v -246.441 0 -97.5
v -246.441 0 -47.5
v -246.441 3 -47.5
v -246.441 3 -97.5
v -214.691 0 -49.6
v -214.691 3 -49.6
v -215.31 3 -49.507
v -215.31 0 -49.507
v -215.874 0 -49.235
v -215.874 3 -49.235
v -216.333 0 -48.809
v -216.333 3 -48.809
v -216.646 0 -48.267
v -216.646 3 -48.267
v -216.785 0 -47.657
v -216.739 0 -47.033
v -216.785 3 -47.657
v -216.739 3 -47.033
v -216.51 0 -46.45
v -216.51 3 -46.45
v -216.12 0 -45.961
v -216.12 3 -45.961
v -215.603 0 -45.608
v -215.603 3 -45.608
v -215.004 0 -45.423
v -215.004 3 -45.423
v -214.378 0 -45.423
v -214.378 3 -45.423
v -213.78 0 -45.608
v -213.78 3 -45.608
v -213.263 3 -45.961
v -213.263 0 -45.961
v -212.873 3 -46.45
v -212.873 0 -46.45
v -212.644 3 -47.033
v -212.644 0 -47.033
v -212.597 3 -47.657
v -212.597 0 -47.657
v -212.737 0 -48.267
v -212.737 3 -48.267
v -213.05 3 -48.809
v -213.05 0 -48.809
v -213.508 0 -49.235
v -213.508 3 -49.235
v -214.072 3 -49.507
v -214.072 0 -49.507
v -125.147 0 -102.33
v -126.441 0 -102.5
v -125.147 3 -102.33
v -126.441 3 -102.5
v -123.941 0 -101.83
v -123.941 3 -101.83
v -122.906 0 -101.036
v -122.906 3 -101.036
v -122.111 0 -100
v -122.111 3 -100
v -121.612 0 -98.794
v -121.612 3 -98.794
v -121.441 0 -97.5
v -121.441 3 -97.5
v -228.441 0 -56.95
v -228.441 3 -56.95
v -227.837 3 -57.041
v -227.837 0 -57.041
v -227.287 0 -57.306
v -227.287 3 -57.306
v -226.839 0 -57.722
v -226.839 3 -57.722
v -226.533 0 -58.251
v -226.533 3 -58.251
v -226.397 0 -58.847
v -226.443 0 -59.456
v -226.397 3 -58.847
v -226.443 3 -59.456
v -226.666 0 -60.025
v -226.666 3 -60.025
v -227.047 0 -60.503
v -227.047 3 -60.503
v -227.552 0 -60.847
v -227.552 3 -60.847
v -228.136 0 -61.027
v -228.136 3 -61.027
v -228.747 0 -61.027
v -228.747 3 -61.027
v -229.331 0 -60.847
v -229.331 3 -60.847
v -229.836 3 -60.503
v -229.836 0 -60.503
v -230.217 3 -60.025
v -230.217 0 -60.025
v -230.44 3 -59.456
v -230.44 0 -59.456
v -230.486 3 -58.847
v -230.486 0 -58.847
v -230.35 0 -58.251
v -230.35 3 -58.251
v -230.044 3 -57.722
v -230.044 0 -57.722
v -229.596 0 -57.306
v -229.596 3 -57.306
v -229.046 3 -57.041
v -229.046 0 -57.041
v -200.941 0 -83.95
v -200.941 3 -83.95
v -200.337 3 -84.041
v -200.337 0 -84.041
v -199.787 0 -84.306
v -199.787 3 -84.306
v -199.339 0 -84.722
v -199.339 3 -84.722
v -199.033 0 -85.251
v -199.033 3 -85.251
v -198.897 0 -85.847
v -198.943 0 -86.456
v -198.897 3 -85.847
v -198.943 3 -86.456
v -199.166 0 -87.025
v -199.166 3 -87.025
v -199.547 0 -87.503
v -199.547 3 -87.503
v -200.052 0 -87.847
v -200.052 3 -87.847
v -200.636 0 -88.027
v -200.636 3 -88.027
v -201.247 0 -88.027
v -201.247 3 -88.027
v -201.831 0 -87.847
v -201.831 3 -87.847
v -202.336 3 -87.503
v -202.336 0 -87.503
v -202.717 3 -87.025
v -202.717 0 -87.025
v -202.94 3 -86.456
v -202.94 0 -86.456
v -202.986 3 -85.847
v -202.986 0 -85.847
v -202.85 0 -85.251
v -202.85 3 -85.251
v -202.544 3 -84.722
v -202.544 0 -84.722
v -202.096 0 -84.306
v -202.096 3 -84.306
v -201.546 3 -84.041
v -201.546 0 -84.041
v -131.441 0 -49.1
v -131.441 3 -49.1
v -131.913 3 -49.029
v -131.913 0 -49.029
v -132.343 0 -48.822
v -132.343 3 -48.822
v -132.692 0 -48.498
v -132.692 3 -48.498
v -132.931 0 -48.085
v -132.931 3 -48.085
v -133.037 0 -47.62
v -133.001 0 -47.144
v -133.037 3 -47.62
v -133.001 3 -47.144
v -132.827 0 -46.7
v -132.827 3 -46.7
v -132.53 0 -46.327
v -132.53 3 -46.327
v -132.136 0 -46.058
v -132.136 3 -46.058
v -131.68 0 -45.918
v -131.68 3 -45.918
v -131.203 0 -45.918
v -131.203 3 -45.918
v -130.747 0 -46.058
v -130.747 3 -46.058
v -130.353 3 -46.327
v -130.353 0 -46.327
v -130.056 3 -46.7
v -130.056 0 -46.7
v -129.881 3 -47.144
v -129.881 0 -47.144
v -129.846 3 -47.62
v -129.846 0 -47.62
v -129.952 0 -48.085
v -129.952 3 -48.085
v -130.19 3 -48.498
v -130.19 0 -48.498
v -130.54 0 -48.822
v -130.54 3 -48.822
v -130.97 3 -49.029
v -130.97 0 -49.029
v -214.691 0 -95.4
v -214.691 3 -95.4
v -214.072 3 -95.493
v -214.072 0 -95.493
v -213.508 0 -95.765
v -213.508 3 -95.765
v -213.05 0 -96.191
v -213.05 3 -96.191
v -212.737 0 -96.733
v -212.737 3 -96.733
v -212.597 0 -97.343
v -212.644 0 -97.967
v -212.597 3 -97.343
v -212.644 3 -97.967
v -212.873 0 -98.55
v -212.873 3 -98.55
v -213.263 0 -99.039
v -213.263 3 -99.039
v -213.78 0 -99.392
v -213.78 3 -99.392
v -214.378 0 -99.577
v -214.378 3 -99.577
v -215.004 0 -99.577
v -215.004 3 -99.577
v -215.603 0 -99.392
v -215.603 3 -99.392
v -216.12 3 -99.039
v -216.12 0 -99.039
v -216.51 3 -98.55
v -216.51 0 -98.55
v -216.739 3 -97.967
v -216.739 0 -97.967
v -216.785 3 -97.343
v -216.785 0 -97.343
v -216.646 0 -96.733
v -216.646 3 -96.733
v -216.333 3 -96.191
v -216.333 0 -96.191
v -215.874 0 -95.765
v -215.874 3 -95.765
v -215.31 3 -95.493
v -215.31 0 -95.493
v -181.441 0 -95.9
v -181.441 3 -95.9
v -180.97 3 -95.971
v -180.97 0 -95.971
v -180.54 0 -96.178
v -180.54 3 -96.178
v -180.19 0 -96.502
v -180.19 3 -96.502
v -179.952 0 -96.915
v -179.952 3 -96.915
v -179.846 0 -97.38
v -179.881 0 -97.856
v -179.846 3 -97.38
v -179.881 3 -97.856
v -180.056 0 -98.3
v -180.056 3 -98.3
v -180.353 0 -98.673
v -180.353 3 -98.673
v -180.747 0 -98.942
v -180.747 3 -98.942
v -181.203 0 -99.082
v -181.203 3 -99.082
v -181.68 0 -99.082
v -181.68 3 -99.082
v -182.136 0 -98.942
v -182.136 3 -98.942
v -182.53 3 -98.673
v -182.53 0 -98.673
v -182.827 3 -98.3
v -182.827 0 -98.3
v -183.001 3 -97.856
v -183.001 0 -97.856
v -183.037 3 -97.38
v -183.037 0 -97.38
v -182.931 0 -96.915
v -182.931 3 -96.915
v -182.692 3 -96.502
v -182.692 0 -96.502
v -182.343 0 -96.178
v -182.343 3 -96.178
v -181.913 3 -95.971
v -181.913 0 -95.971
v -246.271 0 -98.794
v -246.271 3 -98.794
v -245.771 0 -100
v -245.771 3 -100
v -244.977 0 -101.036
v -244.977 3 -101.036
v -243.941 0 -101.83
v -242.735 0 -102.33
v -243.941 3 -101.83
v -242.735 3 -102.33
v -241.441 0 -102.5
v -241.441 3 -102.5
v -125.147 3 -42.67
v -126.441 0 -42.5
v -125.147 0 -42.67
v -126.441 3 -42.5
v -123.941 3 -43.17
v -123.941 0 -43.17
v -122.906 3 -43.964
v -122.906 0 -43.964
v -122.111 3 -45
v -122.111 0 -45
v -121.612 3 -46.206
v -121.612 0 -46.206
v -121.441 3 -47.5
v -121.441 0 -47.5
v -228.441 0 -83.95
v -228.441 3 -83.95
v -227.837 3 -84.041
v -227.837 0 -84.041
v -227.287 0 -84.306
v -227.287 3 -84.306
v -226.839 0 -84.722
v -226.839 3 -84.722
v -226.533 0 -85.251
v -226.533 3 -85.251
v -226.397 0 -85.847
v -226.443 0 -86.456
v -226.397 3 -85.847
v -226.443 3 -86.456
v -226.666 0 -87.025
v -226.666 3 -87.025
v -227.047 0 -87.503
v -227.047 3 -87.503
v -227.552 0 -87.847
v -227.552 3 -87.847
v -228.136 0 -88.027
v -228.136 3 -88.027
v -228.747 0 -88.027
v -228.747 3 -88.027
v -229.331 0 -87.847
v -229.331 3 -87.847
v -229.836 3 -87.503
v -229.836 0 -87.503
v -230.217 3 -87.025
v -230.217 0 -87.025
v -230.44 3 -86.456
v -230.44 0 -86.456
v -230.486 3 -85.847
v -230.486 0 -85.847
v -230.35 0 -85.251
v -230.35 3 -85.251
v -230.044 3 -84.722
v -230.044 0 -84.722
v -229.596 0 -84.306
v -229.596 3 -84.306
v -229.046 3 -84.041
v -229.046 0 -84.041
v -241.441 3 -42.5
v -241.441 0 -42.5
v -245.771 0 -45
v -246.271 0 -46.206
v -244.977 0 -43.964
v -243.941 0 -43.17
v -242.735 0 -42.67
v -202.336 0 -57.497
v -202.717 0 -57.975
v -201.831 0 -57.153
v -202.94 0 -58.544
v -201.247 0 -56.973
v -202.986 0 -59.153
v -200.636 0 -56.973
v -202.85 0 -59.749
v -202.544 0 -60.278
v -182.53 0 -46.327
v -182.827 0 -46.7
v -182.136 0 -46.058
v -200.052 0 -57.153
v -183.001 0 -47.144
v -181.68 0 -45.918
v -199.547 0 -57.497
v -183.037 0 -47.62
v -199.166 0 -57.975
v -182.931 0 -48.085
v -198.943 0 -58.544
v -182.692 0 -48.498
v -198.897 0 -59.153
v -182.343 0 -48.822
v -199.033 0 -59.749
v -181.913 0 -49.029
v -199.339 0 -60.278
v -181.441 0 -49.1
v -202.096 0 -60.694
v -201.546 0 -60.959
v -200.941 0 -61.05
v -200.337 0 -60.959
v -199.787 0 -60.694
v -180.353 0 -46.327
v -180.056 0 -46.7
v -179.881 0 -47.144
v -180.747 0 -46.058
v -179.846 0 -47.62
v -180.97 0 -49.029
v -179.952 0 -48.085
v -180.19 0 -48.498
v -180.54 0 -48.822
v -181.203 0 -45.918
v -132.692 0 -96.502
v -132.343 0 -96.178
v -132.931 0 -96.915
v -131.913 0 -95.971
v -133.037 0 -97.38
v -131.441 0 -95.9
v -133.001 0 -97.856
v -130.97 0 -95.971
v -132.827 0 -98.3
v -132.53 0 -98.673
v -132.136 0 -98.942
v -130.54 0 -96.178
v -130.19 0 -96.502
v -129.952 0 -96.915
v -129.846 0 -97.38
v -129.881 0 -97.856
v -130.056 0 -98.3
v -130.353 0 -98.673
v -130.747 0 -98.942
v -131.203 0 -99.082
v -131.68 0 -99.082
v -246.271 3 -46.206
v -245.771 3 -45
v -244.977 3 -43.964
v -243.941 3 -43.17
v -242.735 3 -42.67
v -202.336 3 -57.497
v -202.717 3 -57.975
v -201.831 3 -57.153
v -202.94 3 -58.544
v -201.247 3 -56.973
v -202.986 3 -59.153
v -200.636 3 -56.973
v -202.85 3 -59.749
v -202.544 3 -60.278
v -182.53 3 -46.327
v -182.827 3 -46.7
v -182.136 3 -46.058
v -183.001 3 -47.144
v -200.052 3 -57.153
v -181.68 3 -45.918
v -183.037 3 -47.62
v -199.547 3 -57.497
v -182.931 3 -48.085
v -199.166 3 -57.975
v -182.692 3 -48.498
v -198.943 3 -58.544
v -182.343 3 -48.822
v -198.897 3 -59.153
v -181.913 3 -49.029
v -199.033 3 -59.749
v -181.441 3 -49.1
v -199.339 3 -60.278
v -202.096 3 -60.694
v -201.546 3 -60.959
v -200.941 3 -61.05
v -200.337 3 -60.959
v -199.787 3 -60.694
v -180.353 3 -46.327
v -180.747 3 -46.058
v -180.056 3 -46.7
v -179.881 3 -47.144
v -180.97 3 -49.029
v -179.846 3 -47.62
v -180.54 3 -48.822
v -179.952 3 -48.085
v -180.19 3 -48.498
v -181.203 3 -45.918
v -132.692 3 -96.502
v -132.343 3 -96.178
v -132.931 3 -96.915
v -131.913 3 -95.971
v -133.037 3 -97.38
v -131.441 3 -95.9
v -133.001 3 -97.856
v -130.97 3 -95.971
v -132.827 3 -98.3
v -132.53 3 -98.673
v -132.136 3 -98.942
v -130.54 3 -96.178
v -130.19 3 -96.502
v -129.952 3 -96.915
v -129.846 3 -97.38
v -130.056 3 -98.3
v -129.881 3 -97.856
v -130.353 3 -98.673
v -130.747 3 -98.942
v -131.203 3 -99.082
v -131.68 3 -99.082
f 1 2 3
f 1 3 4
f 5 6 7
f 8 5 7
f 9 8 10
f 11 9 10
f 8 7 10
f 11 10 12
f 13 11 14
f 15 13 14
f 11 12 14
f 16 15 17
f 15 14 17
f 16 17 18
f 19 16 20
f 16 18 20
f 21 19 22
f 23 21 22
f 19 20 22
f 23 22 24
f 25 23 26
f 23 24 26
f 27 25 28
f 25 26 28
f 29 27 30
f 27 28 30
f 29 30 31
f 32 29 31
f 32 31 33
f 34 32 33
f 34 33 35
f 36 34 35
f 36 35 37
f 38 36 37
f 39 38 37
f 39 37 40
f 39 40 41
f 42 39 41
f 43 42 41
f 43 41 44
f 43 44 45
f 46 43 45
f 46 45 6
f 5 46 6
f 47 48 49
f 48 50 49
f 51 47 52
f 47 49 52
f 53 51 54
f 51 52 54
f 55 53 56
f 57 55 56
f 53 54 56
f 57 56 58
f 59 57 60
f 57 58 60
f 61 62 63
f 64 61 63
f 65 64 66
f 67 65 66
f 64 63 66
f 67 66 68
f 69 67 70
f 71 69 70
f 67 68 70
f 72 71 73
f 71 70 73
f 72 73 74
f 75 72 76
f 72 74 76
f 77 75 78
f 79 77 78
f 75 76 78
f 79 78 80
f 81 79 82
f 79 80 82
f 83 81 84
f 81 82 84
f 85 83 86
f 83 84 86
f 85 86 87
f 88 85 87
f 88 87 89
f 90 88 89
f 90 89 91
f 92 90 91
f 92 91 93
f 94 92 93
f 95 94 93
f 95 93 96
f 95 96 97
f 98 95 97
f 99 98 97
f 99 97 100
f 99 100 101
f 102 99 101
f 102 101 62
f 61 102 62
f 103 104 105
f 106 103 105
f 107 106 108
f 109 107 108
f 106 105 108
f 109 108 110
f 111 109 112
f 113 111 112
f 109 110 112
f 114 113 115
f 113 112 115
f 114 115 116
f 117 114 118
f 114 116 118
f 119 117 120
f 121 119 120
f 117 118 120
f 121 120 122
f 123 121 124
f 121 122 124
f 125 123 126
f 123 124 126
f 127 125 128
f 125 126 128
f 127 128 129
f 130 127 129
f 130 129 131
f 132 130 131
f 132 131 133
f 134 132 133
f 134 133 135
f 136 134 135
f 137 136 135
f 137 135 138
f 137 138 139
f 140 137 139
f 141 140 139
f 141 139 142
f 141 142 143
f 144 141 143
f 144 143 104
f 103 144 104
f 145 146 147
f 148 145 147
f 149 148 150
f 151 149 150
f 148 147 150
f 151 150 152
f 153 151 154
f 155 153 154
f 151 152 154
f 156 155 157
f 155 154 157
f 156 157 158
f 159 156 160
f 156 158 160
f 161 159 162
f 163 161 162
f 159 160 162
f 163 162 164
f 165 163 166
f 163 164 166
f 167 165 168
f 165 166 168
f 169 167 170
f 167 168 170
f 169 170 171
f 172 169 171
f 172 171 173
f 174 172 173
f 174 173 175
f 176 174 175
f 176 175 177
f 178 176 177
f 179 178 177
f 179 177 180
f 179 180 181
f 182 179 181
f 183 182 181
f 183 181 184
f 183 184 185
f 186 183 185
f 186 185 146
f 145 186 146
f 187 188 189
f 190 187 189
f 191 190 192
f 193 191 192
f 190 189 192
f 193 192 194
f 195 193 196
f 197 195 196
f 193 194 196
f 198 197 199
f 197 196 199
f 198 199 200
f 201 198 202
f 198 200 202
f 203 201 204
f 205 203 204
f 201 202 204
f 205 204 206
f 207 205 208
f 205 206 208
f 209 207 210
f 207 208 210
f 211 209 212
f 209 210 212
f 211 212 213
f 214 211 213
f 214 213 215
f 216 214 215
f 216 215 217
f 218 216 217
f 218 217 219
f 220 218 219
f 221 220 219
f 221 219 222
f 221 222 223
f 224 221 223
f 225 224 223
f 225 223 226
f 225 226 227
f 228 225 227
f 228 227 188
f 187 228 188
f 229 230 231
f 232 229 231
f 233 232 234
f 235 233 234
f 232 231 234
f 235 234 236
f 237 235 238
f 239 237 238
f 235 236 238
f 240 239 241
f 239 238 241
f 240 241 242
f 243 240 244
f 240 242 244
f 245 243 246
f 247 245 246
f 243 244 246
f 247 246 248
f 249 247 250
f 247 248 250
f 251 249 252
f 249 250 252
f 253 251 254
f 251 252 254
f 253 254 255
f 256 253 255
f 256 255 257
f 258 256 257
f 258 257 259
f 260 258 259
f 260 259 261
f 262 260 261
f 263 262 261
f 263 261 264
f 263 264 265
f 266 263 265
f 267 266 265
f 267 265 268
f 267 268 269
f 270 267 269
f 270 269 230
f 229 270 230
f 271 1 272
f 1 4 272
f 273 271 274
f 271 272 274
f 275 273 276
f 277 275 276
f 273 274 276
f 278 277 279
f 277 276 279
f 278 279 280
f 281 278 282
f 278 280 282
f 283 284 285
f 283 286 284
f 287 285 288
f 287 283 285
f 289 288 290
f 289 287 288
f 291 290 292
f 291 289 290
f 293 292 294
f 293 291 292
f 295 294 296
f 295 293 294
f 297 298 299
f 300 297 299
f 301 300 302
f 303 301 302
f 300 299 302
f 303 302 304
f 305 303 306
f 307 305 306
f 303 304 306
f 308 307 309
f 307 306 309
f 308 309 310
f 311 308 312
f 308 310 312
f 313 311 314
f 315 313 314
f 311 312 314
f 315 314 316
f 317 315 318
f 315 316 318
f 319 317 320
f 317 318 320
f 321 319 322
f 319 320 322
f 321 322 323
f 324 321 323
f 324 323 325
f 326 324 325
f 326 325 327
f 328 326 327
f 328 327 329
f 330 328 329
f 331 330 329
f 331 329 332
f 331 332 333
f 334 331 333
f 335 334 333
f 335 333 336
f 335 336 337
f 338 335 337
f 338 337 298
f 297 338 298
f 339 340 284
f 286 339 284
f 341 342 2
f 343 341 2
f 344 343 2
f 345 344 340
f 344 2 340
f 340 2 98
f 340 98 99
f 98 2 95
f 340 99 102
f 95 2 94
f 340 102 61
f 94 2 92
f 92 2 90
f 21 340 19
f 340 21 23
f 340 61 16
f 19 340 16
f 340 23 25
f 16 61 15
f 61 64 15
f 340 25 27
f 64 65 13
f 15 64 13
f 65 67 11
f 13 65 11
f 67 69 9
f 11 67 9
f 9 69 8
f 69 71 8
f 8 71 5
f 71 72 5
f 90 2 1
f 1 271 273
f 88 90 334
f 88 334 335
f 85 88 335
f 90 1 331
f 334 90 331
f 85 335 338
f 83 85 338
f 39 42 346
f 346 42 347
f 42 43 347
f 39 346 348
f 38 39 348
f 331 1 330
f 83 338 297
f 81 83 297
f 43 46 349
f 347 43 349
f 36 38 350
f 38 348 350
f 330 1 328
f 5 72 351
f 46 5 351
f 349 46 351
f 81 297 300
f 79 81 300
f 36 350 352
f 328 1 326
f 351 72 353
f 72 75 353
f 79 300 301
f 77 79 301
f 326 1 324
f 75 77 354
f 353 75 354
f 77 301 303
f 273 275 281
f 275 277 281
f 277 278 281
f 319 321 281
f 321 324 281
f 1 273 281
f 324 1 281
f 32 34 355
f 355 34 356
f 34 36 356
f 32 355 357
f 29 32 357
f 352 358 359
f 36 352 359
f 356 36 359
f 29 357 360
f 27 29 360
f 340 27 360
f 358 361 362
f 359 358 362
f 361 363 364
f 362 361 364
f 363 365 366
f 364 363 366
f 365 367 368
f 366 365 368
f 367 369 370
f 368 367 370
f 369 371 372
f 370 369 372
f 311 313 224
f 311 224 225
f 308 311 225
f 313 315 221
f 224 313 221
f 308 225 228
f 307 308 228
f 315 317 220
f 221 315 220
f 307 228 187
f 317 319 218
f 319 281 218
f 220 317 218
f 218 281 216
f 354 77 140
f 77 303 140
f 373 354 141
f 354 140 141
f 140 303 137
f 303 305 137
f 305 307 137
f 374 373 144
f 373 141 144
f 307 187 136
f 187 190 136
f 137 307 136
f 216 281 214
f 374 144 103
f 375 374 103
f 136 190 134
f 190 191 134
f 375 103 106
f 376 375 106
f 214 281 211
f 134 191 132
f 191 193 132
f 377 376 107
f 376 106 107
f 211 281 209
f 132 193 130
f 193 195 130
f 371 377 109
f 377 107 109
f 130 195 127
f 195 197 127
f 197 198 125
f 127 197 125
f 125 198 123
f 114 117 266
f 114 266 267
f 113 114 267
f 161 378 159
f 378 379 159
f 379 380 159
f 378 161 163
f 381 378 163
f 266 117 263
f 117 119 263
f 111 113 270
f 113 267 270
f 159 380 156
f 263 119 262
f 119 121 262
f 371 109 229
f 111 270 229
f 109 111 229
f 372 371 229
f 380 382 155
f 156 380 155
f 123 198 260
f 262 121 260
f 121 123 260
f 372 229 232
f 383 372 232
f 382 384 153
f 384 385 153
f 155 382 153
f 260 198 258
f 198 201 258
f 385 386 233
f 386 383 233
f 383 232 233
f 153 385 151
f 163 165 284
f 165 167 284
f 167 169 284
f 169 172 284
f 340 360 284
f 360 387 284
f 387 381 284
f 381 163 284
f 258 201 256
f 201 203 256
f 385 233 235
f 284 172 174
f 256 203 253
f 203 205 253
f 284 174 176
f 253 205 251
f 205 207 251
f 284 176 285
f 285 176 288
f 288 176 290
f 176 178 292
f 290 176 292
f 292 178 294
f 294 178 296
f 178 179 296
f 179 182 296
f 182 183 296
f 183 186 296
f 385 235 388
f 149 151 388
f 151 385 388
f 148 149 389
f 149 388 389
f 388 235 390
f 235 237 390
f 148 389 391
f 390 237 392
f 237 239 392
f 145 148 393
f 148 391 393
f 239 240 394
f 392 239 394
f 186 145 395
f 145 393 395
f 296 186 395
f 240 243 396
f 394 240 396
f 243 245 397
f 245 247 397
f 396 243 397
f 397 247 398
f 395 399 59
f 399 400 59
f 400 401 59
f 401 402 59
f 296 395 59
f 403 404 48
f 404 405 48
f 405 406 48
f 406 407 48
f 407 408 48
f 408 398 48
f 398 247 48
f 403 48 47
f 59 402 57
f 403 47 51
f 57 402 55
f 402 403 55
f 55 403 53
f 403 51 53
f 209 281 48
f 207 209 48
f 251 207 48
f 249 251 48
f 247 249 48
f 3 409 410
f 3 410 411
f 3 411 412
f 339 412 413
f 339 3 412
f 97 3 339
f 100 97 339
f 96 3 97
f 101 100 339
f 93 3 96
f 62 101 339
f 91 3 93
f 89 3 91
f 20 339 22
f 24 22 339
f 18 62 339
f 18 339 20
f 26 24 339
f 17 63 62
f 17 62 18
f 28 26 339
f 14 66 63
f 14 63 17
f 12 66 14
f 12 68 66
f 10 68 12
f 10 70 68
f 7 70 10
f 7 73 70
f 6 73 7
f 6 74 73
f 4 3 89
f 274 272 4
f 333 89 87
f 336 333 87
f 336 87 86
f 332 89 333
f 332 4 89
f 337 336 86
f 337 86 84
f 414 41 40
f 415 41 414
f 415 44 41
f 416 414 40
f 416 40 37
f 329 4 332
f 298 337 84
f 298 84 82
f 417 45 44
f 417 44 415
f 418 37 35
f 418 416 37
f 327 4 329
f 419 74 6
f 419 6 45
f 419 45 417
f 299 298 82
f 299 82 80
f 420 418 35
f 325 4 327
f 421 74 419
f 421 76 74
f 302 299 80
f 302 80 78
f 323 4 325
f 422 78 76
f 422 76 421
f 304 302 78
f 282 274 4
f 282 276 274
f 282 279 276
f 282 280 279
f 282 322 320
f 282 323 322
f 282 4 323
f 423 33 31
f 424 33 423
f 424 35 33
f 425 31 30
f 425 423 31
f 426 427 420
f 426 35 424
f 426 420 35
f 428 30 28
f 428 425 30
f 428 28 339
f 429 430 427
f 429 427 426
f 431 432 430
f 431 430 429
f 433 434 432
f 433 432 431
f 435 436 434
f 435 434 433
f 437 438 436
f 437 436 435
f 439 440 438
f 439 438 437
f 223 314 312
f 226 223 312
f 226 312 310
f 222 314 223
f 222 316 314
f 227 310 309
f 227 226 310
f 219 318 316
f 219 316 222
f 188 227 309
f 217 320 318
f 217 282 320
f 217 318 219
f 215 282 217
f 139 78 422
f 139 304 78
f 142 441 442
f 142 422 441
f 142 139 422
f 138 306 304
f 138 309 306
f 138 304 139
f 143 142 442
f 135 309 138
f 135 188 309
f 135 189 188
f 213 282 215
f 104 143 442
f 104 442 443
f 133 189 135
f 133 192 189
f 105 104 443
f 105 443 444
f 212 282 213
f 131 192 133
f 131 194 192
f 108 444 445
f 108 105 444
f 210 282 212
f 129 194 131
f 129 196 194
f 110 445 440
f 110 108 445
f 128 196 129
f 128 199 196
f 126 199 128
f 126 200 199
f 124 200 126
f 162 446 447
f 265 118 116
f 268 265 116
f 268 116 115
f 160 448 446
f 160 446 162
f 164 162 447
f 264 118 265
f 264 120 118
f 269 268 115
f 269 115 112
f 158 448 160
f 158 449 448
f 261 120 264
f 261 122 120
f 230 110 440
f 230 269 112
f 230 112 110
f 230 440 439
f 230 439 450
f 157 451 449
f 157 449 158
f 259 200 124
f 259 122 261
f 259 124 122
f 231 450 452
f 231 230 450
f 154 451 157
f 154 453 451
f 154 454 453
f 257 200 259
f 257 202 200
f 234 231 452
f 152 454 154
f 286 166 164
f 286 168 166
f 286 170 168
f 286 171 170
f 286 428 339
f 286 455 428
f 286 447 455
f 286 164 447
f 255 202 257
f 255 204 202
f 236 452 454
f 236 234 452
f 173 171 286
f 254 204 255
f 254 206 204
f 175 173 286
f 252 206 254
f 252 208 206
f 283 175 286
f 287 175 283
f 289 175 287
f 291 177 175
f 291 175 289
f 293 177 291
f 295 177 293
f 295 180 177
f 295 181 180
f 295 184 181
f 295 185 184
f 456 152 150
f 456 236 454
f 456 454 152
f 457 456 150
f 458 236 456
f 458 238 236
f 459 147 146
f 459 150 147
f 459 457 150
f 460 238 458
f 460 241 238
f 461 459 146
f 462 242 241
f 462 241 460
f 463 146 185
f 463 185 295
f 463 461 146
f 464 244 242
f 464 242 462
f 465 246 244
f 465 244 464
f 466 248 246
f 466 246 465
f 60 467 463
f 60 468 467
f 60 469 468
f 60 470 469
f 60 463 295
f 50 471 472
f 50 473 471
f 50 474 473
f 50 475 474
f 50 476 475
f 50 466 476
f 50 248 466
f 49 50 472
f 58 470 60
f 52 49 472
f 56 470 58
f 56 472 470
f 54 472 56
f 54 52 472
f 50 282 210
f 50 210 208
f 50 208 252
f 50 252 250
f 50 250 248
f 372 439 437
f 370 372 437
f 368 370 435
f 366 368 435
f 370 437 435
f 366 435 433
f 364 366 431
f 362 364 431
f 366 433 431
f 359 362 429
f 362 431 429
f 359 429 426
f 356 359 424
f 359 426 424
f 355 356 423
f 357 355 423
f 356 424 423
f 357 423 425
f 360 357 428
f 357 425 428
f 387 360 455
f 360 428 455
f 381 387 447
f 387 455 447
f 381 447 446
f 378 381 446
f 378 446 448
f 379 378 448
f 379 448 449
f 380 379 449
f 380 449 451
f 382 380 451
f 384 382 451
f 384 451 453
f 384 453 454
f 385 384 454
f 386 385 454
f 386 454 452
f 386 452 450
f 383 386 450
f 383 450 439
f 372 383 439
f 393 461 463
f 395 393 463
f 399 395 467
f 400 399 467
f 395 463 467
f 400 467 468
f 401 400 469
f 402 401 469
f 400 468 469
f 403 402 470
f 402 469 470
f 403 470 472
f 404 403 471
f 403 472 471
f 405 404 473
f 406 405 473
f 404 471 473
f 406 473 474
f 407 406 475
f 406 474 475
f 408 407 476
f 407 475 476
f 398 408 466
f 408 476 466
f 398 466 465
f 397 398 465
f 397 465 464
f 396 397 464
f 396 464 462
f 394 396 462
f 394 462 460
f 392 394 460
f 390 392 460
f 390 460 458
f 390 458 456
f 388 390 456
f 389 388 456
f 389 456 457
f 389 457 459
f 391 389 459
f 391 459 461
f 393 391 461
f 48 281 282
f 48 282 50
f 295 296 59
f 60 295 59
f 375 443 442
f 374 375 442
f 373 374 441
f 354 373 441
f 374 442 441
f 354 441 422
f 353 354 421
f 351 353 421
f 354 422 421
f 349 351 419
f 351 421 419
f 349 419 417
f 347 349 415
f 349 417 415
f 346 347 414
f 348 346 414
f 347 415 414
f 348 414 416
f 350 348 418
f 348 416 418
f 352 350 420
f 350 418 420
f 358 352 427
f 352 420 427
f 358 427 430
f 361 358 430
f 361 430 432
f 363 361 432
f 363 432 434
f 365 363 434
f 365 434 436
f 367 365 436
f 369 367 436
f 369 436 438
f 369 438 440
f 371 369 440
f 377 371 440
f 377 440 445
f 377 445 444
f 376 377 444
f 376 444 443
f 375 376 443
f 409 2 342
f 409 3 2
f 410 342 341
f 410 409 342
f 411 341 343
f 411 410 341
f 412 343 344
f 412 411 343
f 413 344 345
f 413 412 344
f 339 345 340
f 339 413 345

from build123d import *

# Parameters (mm, degrees)
SKETCH_1_W          = 125
SKETCH_1_H          = 60
EXTRUDE_1_DEPTH     = 3
SKETCH_2_R          = 2.05
SKETCH_2_R_2        = 2.1
CUT_EXTRUDE_1_DEPTH = 267.924326413
SKETCH_3_R          = 1.6
CUT_EXTRUDE_2_DEPTH = 267.924326413
FILLET_1_R          = 5


with BuildPart() as part:
    # 草图1 → 凸台-拉伸1 (new body)
    with BuildSketch(Plane(origin=(0, 0, 0), x_dir=(1, 0, 0), z_dir=(0, 1, 0))):
        with Locations((-183.941364286, 72.5)):
            Rectangle(SKETCH_1_W, SKETCH_1_H)
    extrude(amount=EXTRUDE_1_DEPTH)

    # 草图2 → 切除-拉伸1 (cut, through all)
    with BuildSketch(Plane(origin=(0, 3, 0), x_dir=(1, 0, 0), z_dir=(0, 1, 0))):
        with Locations(Location((-228.441364286, 86, 0), (0, 0, 270))):
            Circle(SKETCH_2_R)
        with Locations(Location((-228.441364286, 59, 0), (0, 0, 270))):
            Circle(SKETCH_2_R)
        with Locations(Location((-200.941364286, 86, 0), (0, 0, 270))):
            Circle(SKETCH_2_R)
        with Locations(Location((-200.941364286, 59, 0), (0, 0, 90))):
            Circle(SKETCH_2_R)
        with Locations(Location((-214.691364286, 97.5, 0), (0, 0, 270))):
            Circle(SKETCH_2_R_2)
        with Locations(Location((-214.691364286, 47.5, 0), (0, 0, 90))):
            Circle(SKETCH_2_R_2)
    extrude(amount=-CUT_EXTRUDE_1_DEPTH, mode=Mode.SUBTRACT)

    # 草图3 → 切除-拉伸2 (cut, through all)
    with BuildSketch(Plane(origin=(0, 3, 0), x_dir=(1, 0, 0), z_dir=(0, 1, 0))):
        with Locations(Location((-181.441364286, 97.5, 0), (0, 0, 270))):
            Circle(SKETCH_3_R)
        with Locations(Location((-131.441364286, 97.5, 0), (0, 0, 270))):
            Circle(SKETCH_3_R)
        with Locations(Location((-131.441364286, 47.5, 0), (0, 0, 90))):
            Circle(SKETCH_3_R)
        with Locations(Location((-181.441364286, 47.5, 0), (0, 0, 90))):
            Circle(SKETCH_3_R)
    extrude(amount=-CUT_EXTRUDE_2_DEPTH, mode=Mode.SUBTRACT)

    # 圆角1
    fillet_1_edges = [part.edges().sort_by_distance(p)[0] for p in [
        (-121.441364286, 1.5, -42.5),
        (-246.441364286, 1.5, -42.5),
        (-246.441364286, 1.5, -102.5),
        (-121.441364286, 1.5, -102.5),
    ]]
    fillet(fillet_1_edges, radius=FILLET_1_R)


solid = part.part
